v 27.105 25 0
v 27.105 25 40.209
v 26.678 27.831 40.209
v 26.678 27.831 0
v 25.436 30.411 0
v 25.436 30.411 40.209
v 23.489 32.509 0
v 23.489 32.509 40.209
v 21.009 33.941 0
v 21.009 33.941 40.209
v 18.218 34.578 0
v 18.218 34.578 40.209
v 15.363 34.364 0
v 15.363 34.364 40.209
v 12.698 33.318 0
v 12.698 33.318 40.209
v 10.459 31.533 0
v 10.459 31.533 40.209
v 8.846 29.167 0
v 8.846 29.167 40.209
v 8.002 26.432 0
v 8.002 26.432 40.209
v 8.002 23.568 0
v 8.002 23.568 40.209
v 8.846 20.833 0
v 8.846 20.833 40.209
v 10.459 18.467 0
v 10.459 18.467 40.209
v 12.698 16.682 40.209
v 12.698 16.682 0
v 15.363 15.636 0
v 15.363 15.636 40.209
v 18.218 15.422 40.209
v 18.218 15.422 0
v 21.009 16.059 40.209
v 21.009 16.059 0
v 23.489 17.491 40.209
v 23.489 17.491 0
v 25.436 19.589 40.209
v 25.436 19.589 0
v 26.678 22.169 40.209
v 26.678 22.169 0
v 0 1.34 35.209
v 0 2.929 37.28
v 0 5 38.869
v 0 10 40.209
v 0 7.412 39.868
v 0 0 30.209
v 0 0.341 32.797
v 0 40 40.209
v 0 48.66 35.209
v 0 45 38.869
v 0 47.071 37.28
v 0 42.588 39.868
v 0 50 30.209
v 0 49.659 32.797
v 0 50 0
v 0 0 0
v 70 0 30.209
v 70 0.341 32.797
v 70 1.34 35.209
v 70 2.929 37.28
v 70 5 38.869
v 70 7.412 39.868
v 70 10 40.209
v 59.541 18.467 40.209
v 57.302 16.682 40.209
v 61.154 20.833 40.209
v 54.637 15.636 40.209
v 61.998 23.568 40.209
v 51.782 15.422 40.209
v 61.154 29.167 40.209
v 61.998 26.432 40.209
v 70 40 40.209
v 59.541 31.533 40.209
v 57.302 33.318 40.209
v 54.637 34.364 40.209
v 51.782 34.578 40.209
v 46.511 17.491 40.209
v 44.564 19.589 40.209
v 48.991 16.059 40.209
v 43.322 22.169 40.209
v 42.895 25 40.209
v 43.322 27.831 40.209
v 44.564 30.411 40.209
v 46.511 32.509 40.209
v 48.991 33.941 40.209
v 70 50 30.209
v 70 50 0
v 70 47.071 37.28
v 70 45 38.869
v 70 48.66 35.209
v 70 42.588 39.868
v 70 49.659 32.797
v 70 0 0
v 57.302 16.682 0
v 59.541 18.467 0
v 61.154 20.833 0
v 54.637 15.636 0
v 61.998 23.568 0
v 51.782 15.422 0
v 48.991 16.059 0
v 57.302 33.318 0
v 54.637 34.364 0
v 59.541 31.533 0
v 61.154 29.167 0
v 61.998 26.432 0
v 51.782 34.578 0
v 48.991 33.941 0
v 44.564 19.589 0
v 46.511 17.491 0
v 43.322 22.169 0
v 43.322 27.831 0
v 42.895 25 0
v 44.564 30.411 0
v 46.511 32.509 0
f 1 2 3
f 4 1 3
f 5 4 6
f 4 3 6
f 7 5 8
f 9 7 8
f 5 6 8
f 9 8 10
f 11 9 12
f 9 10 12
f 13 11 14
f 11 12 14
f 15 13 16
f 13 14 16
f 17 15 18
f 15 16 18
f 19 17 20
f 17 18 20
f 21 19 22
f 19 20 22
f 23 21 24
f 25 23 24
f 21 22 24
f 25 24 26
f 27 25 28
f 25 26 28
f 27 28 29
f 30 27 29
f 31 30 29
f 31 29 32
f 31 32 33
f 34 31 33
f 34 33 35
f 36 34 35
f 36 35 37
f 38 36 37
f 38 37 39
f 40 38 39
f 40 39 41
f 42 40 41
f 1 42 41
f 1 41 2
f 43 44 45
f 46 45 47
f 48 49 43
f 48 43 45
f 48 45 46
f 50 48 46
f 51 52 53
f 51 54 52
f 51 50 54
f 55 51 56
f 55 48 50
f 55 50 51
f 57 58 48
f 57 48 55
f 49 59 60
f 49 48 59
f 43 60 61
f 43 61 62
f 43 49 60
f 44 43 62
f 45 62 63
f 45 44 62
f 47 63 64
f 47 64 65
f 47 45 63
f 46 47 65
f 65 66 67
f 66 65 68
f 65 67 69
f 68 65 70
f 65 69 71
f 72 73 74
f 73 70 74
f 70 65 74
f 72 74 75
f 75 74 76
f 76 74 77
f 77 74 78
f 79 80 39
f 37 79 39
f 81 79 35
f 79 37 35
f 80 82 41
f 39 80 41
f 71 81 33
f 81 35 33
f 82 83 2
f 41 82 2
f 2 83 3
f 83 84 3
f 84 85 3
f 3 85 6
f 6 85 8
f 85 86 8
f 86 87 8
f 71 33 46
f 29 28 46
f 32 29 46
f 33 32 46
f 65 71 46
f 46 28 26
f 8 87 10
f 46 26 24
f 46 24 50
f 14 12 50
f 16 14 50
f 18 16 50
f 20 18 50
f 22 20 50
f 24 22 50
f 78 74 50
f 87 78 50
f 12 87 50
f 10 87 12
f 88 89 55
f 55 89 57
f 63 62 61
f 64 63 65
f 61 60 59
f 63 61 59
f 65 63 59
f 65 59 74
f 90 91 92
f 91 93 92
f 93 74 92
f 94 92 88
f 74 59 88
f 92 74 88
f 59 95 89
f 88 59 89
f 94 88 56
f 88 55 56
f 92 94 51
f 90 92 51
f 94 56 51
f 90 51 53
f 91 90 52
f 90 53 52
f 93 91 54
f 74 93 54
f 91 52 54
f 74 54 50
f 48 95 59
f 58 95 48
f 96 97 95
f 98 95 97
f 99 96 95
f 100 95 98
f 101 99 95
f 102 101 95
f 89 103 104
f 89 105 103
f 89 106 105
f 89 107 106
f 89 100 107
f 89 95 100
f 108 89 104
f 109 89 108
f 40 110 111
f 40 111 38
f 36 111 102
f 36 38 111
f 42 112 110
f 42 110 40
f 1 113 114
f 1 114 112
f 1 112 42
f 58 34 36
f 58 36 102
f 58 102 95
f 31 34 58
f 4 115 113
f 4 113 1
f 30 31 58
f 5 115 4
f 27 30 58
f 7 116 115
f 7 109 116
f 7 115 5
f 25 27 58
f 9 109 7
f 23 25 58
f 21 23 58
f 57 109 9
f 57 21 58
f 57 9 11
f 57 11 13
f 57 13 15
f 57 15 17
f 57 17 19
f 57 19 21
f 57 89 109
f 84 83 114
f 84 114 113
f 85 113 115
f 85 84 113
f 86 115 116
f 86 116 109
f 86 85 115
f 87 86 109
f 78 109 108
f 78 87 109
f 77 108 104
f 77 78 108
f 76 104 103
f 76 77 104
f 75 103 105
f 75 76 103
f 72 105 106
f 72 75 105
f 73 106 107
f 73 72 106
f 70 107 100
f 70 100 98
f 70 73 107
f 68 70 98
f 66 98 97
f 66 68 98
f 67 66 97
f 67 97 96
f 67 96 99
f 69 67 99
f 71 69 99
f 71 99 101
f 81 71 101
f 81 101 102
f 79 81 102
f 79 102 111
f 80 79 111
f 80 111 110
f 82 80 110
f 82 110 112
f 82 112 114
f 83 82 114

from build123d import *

# Parameters (mm, degrees)
F0_W     = 35
F0_H     = 50
F1_DEPTH = 40.208638
F2_R     = 10
F3_R     = 9.604884
F4_DEPTH = 72.155587


with BuildPart() as f1:
    # F0 (on Top) → F1 (new body)
    with BuildSketch(Plane.XY):
        with Locations((17.5, 25)):
            Rectangle(F0_W, F0_H)
    extrude(amount=F1_DEPTH)

    # F2
    f2_edges = [f1.edges().sort_by_distance(p)[0] for p in [
        (17.5, 0, 40.208638),
        (17.5, 50, 40.208638),
    ]]
    fillet(f2_edges, radius=F2_R)

    # F3 (on face) → F4 (cut)
    with BuildSketch(Plane.XY.offset(40.208638)):
        with Locations((17.5, 25)):
            Circle(F3_R)
    extrude(amount=-F4_DEPTH, mode=Mode.SUBTRACT)

    # F5: F1 across face


with BuildPart() as f1_1:
    add(f1.part)
    add(f1.part.mirror(Plane(origin=(35, 25, 19.714479), x_dir=(0, 1, 0), z_dir=(1, 0, 0))))


solid = f1_1.part
